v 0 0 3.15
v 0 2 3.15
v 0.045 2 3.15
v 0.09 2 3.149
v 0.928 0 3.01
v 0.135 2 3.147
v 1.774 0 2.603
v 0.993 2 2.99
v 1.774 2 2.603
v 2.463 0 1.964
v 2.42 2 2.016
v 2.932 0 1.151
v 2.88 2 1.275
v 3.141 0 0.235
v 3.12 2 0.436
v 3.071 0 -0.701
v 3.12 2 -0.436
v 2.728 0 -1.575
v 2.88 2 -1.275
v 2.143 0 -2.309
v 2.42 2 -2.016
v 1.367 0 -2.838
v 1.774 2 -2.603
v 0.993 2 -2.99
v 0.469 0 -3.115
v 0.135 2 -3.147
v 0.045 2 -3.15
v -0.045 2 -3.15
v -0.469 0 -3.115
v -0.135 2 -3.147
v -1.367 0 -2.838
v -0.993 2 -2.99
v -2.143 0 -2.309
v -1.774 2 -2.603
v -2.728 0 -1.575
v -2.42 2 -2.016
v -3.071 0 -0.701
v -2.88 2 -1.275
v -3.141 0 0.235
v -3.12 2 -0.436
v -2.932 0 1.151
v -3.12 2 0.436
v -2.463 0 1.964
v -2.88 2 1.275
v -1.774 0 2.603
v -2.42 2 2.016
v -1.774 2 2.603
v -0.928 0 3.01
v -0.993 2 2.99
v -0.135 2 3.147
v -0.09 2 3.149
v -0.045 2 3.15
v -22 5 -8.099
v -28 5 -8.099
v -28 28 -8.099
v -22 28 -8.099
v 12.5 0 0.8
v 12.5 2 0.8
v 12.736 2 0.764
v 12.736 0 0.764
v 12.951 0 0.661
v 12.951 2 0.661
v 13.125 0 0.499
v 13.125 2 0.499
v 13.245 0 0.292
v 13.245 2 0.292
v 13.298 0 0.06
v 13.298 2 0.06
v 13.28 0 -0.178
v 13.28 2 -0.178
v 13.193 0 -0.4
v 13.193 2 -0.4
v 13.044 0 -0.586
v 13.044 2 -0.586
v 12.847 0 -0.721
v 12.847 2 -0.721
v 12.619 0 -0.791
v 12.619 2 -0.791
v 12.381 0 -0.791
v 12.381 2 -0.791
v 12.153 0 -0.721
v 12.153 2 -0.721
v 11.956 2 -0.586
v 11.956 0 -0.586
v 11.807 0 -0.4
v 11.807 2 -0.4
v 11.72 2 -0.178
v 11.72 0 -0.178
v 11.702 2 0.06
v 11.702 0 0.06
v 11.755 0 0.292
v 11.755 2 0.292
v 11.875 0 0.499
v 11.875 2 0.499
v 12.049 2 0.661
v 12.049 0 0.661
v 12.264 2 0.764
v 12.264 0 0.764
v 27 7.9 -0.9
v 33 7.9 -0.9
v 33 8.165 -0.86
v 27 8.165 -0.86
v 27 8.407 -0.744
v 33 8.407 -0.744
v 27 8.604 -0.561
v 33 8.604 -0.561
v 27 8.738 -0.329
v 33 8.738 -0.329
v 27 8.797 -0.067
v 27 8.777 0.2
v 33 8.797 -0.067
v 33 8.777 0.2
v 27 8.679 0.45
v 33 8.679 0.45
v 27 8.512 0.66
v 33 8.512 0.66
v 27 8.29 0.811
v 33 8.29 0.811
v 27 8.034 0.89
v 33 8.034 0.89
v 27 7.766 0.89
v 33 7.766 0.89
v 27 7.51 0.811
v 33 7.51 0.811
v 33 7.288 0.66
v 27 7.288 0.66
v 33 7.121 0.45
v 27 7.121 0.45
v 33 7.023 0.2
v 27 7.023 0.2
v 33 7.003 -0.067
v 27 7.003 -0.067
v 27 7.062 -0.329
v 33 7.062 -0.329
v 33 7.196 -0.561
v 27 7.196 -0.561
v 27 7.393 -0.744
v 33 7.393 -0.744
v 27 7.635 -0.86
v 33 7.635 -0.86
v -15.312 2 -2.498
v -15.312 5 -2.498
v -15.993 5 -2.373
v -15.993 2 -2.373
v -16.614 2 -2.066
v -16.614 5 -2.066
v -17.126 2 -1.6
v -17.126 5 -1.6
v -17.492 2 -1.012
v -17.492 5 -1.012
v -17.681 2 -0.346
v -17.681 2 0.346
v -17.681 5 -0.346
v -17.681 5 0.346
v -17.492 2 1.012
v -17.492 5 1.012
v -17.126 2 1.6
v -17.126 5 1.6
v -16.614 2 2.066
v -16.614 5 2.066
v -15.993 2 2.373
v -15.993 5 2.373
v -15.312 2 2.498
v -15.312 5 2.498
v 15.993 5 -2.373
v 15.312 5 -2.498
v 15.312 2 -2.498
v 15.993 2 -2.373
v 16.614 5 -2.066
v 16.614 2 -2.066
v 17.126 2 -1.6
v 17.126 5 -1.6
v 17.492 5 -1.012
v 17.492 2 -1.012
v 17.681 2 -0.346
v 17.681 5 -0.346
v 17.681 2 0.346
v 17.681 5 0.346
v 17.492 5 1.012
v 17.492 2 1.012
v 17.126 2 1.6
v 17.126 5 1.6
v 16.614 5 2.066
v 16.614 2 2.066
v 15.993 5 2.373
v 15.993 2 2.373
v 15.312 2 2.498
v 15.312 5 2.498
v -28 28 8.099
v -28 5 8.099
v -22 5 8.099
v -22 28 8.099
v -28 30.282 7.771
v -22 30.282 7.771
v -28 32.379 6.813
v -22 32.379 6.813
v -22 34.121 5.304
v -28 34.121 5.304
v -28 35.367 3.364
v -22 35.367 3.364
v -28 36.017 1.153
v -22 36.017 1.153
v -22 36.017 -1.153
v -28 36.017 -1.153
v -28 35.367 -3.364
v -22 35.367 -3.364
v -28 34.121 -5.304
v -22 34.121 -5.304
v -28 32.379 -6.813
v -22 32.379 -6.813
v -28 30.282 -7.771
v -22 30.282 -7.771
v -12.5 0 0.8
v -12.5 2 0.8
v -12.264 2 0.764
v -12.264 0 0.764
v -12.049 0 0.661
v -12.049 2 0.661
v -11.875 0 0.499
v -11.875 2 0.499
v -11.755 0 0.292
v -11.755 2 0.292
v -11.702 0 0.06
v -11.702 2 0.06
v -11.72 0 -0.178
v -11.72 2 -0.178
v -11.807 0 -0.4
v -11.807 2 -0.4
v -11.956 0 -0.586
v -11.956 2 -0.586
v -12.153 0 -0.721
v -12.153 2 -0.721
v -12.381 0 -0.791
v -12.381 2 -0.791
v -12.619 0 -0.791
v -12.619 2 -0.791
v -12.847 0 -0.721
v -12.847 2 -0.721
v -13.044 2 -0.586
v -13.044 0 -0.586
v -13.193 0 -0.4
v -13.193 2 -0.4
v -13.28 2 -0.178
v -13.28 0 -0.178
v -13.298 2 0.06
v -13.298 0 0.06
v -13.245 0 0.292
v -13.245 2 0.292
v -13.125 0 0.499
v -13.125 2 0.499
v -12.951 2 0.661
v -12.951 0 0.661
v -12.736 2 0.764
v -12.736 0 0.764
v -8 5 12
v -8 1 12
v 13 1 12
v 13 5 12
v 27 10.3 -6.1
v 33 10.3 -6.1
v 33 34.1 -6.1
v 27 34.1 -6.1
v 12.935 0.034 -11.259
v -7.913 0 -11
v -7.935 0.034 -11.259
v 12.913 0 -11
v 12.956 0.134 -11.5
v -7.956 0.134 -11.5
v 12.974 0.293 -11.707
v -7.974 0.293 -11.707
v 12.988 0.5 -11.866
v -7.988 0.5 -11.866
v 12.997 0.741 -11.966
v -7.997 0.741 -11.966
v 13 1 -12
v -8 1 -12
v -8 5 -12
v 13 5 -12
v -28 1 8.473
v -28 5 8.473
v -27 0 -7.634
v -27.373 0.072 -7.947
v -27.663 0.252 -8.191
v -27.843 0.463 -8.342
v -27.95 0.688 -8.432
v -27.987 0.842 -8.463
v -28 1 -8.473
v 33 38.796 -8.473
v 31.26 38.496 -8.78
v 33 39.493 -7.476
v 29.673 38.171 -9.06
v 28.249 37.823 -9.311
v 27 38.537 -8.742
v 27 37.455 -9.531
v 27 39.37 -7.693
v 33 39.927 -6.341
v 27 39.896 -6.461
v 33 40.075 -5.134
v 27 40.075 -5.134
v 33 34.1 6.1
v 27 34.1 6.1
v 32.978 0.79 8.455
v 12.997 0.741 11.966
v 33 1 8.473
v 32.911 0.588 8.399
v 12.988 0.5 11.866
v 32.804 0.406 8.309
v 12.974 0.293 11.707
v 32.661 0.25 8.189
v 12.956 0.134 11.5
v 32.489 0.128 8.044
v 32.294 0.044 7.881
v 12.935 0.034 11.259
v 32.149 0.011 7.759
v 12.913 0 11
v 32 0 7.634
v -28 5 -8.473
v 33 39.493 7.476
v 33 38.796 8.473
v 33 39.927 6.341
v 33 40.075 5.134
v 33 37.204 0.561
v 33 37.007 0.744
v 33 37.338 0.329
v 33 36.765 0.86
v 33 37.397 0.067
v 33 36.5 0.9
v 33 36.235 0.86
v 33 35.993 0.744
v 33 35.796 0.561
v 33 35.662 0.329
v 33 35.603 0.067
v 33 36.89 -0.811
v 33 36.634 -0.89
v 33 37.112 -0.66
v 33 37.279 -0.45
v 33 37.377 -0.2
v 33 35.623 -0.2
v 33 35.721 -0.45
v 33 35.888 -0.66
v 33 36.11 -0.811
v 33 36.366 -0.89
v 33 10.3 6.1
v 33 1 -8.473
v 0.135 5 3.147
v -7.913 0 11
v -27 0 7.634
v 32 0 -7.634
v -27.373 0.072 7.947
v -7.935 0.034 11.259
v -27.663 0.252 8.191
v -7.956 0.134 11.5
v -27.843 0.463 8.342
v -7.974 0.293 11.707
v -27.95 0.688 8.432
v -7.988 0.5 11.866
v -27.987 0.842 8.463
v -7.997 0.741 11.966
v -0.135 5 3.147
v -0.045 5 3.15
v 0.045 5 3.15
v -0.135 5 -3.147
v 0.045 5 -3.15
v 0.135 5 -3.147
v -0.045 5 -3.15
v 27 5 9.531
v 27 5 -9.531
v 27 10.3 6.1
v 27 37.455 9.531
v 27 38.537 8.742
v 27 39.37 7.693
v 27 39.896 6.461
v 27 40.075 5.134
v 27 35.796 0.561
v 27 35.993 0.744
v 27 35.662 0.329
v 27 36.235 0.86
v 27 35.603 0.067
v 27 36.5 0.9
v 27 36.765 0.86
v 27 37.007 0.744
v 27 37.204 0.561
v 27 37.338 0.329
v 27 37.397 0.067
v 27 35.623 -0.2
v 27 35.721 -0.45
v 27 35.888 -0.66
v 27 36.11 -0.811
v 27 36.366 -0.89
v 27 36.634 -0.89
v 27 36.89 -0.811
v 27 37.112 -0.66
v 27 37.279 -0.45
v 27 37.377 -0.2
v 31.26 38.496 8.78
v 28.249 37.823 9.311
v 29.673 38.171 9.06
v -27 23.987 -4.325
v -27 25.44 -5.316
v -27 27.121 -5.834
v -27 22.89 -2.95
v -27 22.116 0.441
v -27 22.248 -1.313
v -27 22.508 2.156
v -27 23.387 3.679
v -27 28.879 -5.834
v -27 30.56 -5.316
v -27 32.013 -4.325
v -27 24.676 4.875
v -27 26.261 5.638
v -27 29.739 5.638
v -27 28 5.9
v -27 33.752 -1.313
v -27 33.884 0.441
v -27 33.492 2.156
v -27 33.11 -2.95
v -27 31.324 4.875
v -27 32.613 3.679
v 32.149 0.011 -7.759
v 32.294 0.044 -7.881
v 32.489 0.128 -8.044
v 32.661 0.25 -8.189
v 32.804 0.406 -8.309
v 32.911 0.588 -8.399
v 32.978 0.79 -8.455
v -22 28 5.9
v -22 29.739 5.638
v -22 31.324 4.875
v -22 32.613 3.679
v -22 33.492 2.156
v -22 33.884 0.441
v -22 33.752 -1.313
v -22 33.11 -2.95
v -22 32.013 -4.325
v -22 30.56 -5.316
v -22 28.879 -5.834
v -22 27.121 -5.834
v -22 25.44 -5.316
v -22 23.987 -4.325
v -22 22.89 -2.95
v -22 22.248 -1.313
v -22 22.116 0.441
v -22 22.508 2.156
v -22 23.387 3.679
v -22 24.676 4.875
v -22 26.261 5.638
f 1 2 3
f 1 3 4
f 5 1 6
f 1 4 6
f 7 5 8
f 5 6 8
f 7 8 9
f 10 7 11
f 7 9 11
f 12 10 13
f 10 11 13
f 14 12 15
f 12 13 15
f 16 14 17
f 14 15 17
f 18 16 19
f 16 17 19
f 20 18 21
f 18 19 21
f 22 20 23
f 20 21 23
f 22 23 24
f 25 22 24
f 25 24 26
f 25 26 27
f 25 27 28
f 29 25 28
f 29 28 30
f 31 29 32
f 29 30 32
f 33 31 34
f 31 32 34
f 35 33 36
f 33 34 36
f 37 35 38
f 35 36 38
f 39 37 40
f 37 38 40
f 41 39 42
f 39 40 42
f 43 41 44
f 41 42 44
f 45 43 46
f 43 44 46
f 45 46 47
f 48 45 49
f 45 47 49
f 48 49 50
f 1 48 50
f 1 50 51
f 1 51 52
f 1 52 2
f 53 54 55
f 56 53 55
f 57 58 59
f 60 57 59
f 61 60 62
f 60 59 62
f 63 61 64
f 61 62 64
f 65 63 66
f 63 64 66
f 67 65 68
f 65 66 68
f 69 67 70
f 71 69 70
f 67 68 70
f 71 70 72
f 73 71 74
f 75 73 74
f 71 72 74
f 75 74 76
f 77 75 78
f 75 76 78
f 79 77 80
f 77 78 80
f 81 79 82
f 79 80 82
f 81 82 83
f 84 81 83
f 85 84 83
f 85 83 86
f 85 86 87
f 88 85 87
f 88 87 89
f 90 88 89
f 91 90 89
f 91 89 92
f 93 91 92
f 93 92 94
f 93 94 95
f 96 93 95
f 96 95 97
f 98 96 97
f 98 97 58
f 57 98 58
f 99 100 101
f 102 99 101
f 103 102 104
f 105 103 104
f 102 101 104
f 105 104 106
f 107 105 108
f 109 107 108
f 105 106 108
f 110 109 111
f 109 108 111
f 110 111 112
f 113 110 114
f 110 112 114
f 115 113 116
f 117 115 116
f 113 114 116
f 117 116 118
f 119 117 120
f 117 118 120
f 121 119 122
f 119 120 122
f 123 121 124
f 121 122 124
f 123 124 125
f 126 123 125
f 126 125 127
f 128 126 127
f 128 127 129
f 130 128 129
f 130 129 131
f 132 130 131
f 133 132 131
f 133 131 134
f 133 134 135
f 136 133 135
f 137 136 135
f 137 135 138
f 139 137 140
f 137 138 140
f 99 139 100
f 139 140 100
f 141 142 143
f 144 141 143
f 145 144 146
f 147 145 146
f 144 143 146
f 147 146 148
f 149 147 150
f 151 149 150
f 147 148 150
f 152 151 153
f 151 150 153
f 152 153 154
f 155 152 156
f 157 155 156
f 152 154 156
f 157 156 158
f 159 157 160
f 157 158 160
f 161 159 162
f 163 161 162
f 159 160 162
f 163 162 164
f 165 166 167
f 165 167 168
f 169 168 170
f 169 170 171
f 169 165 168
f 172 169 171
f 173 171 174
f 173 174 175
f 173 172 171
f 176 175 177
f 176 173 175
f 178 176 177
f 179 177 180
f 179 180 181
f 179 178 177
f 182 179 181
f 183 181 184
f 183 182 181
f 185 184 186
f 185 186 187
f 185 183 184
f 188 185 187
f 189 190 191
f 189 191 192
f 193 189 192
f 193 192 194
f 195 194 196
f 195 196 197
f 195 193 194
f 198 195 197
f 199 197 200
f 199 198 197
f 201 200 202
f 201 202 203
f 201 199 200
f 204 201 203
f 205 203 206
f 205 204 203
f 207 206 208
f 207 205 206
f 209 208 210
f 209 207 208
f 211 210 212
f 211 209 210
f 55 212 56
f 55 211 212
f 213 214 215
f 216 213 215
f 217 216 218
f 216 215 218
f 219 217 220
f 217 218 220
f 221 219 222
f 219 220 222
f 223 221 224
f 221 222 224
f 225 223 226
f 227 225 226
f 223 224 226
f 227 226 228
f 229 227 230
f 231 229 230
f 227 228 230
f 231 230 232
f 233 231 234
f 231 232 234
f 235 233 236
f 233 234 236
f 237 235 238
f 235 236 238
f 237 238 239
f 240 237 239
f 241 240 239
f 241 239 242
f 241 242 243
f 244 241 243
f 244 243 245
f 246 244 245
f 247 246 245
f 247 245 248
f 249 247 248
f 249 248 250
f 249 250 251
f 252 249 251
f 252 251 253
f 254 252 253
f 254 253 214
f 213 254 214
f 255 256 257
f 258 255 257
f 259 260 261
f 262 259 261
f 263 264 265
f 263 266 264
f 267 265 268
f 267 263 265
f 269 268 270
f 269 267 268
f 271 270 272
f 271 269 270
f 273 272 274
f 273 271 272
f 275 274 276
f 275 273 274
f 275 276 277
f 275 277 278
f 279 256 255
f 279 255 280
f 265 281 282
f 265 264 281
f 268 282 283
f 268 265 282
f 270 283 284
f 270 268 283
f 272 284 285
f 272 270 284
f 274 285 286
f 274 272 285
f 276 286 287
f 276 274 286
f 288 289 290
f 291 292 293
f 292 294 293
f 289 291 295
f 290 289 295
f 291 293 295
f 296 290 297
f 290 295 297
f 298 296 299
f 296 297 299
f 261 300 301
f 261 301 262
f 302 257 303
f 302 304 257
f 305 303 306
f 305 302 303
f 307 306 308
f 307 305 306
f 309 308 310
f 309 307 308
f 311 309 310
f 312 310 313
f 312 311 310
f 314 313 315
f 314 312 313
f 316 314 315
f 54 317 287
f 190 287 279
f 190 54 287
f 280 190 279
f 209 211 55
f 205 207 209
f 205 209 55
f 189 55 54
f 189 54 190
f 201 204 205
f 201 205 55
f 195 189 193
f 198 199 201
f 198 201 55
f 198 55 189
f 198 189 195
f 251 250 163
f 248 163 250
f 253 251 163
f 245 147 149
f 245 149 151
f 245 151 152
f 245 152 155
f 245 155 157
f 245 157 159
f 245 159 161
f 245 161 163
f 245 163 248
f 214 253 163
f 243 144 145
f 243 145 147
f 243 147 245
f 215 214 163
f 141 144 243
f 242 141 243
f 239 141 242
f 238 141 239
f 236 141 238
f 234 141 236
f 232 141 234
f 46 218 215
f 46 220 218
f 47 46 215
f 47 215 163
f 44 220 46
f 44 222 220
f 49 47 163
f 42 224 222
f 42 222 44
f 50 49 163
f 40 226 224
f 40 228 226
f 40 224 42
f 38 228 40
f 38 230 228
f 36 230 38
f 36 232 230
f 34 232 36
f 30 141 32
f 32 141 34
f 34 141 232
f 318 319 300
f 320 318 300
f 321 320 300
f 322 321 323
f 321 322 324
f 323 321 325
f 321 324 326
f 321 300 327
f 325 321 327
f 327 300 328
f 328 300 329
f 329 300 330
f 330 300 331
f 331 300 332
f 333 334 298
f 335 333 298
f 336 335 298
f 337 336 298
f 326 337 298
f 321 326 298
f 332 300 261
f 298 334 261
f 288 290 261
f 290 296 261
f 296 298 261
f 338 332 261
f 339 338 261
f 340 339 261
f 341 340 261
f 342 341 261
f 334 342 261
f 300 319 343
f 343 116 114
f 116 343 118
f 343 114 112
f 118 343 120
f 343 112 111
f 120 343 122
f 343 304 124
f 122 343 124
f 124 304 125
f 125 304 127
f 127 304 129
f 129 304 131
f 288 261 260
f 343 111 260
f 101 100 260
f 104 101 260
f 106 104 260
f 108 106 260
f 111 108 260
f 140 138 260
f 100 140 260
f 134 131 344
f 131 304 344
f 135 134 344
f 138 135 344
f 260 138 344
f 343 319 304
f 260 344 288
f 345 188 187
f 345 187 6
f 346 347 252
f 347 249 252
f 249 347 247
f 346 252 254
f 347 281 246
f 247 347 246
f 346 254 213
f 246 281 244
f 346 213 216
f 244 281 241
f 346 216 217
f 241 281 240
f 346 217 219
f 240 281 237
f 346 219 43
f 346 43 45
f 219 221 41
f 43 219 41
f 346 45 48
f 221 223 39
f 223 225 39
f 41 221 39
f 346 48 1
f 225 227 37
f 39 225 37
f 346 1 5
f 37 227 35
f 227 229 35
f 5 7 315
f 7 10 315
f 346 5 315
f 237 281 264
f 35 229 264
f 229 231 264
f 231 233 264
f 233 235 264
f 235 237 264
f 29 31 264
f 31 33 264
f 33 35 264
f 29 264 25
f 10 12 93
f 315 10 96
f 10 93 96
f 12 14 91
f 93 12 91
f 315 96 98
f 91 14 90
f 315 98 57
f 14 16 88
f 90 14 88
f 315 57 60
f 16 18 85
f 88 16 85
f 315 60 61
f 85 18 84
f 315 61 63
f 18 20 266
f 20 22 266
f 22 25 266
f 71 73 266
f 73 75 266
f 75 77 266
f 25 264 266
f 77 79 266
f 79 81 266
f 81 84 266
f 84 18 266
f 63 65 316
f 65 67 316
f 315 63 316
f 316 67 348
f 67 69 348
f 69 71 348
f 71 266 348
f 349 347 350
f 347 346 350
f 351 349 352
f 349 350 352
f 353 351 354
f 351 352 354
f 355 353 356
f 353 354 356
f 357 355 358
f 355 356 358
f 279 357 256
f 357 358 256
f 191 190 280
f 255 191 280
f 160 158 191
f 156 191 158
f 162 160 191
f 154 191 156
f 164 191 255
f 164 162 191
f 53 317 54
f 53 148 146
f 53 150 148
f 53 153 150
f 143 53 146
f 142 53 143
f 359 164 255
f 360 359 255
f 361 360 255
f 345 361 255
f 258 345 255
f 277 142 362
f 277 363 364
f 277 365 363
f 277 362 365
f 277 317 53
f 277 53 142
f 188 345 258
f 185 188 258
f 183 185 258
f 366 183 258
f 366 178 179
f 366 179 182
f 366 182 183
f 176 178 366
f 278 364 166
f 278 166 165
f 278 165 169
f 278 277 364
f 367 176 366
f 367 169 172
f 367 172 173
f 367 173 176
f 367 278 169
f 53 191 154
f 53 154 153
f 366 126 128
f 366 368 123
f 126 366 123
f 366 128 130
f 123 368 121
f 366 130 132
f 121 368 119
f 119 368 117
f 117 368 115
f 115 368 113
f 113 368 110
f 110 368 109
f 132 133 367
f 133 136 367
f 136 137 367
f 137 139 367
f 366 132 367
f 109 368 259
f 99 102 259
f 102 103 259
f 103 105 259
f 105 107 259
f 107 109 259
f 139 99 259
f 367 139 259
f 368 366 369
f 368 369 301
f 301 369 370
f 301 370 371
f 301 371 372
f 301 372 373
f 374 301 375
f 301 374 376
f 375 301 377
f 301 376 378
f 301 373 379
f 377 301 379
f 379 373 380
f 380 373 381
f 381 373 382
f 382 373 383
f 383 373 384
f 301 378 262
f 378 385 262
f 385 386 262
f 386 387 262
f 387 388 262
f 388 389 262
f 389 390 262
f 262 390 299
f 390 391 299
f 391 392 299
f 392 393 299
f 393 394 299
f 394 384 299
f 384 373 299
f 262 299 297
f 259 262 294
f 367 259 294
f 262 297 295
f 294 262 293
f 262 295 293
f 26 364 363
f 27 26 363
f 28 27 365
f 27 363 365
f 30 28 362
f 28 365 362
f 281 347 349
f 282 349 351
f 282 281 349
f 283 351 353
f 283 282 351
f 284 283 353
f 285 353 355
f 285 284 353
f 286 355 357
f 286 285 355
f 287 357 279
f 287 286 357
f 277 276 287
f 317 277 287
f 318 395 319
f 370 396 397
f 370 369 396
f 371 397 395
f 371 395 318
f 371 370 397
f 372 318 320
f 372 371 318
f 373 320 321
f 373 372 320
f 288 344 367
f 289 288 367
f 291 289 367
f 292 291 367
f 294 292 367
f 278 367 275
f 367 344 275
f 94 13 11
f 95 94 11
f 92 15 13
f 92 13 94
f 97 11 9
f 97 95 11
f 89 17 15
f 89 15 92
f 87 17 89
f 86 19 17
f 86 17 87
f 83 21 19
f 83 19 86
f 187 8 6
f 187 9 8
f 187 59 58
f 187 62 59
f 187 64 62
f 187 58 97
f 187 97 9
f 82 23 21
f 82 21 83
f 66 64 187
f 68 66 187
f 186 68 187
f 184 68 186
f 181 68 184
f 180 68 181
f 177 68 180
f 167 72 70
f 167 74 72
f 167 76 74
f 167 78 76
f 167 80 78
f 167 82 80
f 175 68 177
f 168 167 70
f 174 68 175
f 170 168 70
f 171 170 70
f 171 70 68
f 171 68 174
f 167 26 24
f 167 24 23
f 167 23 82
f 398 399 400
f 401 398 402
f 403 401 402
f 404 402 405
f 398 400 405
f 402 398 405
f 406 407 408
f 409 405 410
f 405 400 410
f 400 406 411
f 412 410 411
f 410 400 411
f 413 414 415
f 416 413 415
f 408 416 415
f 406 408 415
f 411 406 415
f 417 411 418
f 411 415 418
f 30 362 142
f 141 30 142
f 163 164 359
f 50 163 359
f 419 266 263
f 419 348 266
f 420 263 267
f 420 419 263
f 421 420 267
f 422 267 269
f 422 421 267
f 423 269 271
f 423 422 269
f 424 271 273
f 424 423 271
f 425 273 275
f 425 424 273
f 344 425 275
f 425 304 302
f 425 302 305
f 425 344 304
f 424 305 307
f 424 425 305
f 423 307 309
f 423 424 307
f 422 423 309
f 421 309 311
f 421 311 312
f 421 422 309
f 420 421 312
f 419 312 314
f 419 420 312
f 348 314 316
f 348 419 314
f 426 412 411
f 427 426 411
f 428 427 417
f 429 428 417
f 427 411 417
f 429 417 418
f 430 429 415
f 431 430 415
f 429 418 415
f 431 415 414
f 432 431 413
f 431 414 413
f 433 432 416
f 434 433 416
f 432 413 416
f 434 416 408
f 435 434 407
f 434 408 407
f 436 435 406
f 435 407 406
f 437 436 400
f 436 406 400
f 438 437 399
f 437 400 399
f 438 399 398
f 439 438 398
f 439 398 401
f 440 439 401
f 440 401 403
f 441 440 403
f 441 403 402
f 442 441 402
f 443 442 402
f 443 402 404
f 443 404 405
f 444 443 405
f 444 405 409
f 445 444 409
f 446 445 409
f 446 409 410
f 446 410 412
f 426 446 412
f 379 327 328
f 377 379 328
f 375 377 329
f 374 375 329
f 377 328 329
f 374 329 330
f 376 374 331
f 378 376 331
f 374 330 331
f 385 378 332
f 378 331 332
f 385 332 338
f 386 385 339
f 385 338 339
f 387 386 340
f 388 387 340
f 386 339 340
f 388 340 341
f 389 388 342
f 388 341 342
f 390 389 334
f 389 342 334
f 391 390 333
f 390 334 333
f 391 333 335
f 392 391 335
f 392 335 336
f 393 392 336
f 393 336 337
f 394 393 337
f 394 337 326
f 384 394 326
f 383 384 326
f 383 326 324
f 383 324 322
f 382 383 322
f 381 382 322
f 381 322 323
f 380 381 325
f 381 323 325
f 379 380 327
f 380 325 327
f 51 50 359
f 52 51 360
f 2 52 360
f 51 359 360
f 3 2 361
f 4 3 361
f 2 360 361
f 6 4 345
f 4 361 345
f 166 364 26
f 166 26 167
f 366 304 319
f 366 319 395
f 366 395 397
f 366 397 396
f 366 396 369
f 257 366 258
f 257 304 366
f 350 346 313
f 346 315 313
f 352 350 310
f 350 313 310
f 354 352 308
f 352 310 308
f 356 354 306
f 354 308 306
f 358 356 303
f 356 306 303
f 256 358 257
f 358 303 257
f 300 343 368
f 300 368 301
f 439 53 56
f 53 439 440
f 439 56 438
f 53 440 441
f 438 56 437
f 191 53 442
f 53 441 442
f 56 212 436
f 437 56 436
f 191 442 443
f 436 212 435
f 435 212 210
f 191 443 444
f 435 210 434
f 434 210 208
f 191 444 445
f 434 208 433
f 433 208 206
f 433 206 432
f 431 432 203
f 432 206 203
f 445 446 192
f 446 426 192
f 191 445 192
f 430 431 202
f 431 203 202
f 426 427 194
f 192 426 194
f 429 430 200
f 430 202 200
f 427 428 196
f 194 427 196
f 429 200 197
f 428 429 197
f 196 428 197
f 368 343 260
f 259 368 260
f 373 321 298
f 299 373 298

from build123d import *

# Parameters (mm, degrees)
SKETCH_1_W          = 61
SKETCH_1_H          = 24
EXTRUDE_1_DEPTH     = 5
SKETCH_2_W          = 16.198202564
SKETCH_2_H          = 31.099101282
SKETCH_2_R          = 5.9
EXTRUDE_2_DEPTH     = 6
SKETCH_8_R          = 5.9
EXTRUDE_4_DEPTH     = 1
FILLET_1_RADIUS     = 8.099101282
FILLET_1_LENGTH     = 6
SKETCH_3_W          = 20.26798367
SKETCH_3_H          = 35.075185683
SKETCH_3_R          = 0.9
SKETCH_3_W_2        = 12.2
SKETCH_3_H_2        = 23.8
EXTRUDE_3_DEPTH     = 6
FILLET_2_R          = 5
CHAMFER_1_SIZE      = 3.526539614
CHAMFER_1_SIZE_2    = 20
FILLET_4_R          = 1
CUT_EXTRUDE_1_DEPTH = 3
SKETCH_5_R          = 3.15
SKETCH_5_R_2        = 0.8
CUT_EXTRUDE_2_DEPTH = 2.4


with BuildPart() as part:
    # 草图1 → 凸台-拉伸1 (new body)
    with BuildSketch(Plane(origin=(0, 0, 0), x_dir=(1, 0, 0), z_dir=(0, 1, 0))):
        with Locations((2.5, 0)):
            Rectangle(SKETCH_1_W, SKETCH_1_H)
    extrude(amount=EXTRUDE_1_DEPTH)

    # 草图2 → 凸台-拉伸2 (add)
    with BuildSketch(Plane.ZY.offset(28)):
        with Locations((0, 20.549550641)):
            Rectangle(SKETCH_2_W, SKETCH_2_H)
        with Locations((0, 28)):
            Circle(SKETCH_2_R, mode=Mode.SUBTRACT)
    extrude(amount=-EXTRUDE_2_DEPTH)

    # 草图8 → 凸台-拉伸4 (add)
    with BuildSketch(Plane.ZY.offset(28)):
        with Locations((0, 28)):
            Circle(SKETCH_8_R)
    extrude(amount=-EXTRUDE_4_DEPTH)

    # 圆角1: full round fillet: the end face becomes a half cylinder, R = half its width
    fillet_1_face = Plane((-25, 36.099101282, 0), x_dir=(-1, 0, 0), z_dir=(0, 1, 0))  # on the end face: x along it, z out of the body
    fillet_1_slab = fillet_1_face.offset(-FILLET_1_RADIUS / 2) * Box(FILLET_1_LENGTH, 2 * FILLET_1_RADIUS, FILLET_1_RADIUS, mode=Mode.PRIVATE)  # the body's end, R deep
    fillet_1_round = Plane((-25, 28, 0), x_dir=(0, 1, 0), z_dir=(-1, 0, 0)) * Cylinder(FILLET_1_RADIUS, FILLET_1_LENGTH, mode=Mode.PRIVATE)  # its axis R under the face
    add(fillet_1_slab - fillet_1_round, mode=Mode.SUBTRACT)

    # 草图3 → 凸台-拉伸3 (add)
    with BuildSketch(Plane(origin=(33, 0, 0), x_dir=(0, 0, -1), z_dir=(1, 0, 0))):
        with Locations((0, 22.537592842)):
            Rectangle(SKETCH_3_W, SKETCH_3_H)
        with Locations((0, 7.9)):
            Circle(SKETCH_3_R, mode=Mode.SUBTRACT)
        with Locations(Location((0, 36.5, 0), (0, 0, 180))):
            Circle(SKETCH_3_R, mode=Mode.SUBTRACT)
        with Locations((0, 22.2)):
            Rectangle(SKETCH_3_W_2, SKETCH_3_H_2, mode=Mode.SUBTRACT)
    extrude(amount=-EXTRUDE_3_DEPTH)

    # 圆角2
    fillet_2_edges = [part.edges().sort_by_distance(p)[0] for p in [
        (30, 40.075185683, 10.133991835),
        (30, 40.075185683, -10.133991835),
    ]]
    fillet(fillet_2_edges, radius=FILLET_2_R)

    # 倒角1
    # the kernel refuses this chamfer: 20, 3.526539614 mm, written as the material it takes off along each edge
    with BuildSketch(Plane(origin=(33, -51.970775928, -12), x_dir=(0.21013876076743143, 0, 0.9776715712462587), z_dir=(0, 1, 0))) as chamfer_1_piece_1:
        Polygon((CHAMFER_1_SIZE * 0.977671571293, -CHAMFER_1_SIZE * 0.210138760778), (-CHAMFER_1_SIZE_2 * 0.210138760767, -CHAMFER_1_SIZE_2 * 0.977671571246), (0, 0), align=None)
    extrude(amount=108.941551857, mode=Mode.SUBTRACT)
    with BuildSketch(Plane(origin=(-28, -51.970775928, -12), x_dir=(0.9999776716360547, 0, -0.006682531656102014), z_dir=(0, 1, 0))) as chamfer_1_piece_2:
        Polygon((CHAMFER_1_SIZE_2 * 0.999977671636, -CHAMFER_1_SIZE_2 * 0.0066825316561), (-CHAMFER_1_SIZE * 0.00668253165642, -CHAMFER_1_SIZE * 0.999977671684), (0, 0), align=None)
    extrude(amount=108.941551857, mode=Mode.SUBTRACT)
    with BuildSketch(Plane(origin=(33, -51.970775928, 12), x_dir=(0.21013876076743124, 0, -0.9776715712462587), z_dir=(0, 1, 0))) as chamfer_1_piece_3:
        Polygon((CHAMFER_1_SIZE * 0.977671571293, CHAMFER_1_SIZE * 0.210138760778), (-CHAMFER_1_SIZE_2 * 0.210138760767, CHAMFER_1_SIZE_2 * 0.977671571246), (0, 0), align=None)
    extrude(amount=108.941551857, mode=Mode.SUBTRACT)
    with BuildSketch(Plane(origin=(-28, -51.970775928, 12), x_dir=(0.9999776716360547, 0, 0.006682531656101331), z_dir=(0, 1, 0))) as chamfer_1_piece_4:
        Polygon((CHAMFER_1_SIZE_2 * 0.999977671636, CHAMFER_1_SIZE_2 * 0.0066825316561), (-CHAMFER_1_SIZE * 0.00668253165642, CHAMFER_1_SIZE * 0.999977671684), (0, 0), align=None)
    extrude(amount=108.941551857, mode=Mode.SUBTRACT)

    # 圆角4
    fillet_4_edges = [part.edges().sort_by_distance(p)[0] for p in [
        (2.5, 0, -12),
        (-28, 0, 0),
        (33, 0, 0),
        (2.5, 0, 12),
        (-18, 0, -10.236730193),
        (-18, 0, 10.236730193),
        (23, 0, 10.236730193),
        (23, 0, -10.236730193),
    ]]
    fillet(fillet_4_edges, radius=FILLET_4_R)

    # 草图4 → 切除-拉伸1 (cut)
    with BuildSketch(Plane(origin=(-24, 5, 6), x_dir=(-1, 0, 0), z_dir=(0, -1, 0))):
        with BuildLine():
            Line((-23.865345259, 9.147120605), (-8.68757668, 8.497714766))
            ThreePointArc((-8.68757668, 8.497714766), (-6.294445522, 6), (-8.68757668, 3.502285234))
            Line((-8.68757668, 3.502285234), (-23.865345259, 2.852879395))
            ThreePointArc((-23.865345259, 2.852879395), (-27.15, 6), (-23.865345259, 9.147120605))
        make_face()
    cut_extrude_1 = extrude(amount=CUT_EXTRUDE_1_DEPTH, mode=Mode.SUBTRACT)

    # 镜向1: 切除-拉伸1 across plane
    add(cut_extrude_1.mirror(Plane(origin=(0, 0, 0), x_dir=(0, 0, 1), z_dir=(1, 0, 0))), mode=Mode.SUBTRACT)

    # 草图5 → 切除-拉伸2 (cut)
    with BuildSketch(Plane(origin=(0, 2, 0), x_dir=(1, 0, 0), z_dir=(0, 1, 0))):
        with Locations(Location((0, 0, 0), (0, 0, 270))):
            Circle(SKETCH_5_R)
        with Locations(Location((-12.5, 0, 0), (0, 0, 270))):
            Circle(SKETCH_5_R_2)
        with Locations(Location((12.5, 0, 0), (0, 0, 270))):
            Circle(SKETCH_5_R_2)
    extrude(amount=-CUT_EXTRUDE_2_DEPTH, mode=Mode.SUBTRACT)


solid = part.part
